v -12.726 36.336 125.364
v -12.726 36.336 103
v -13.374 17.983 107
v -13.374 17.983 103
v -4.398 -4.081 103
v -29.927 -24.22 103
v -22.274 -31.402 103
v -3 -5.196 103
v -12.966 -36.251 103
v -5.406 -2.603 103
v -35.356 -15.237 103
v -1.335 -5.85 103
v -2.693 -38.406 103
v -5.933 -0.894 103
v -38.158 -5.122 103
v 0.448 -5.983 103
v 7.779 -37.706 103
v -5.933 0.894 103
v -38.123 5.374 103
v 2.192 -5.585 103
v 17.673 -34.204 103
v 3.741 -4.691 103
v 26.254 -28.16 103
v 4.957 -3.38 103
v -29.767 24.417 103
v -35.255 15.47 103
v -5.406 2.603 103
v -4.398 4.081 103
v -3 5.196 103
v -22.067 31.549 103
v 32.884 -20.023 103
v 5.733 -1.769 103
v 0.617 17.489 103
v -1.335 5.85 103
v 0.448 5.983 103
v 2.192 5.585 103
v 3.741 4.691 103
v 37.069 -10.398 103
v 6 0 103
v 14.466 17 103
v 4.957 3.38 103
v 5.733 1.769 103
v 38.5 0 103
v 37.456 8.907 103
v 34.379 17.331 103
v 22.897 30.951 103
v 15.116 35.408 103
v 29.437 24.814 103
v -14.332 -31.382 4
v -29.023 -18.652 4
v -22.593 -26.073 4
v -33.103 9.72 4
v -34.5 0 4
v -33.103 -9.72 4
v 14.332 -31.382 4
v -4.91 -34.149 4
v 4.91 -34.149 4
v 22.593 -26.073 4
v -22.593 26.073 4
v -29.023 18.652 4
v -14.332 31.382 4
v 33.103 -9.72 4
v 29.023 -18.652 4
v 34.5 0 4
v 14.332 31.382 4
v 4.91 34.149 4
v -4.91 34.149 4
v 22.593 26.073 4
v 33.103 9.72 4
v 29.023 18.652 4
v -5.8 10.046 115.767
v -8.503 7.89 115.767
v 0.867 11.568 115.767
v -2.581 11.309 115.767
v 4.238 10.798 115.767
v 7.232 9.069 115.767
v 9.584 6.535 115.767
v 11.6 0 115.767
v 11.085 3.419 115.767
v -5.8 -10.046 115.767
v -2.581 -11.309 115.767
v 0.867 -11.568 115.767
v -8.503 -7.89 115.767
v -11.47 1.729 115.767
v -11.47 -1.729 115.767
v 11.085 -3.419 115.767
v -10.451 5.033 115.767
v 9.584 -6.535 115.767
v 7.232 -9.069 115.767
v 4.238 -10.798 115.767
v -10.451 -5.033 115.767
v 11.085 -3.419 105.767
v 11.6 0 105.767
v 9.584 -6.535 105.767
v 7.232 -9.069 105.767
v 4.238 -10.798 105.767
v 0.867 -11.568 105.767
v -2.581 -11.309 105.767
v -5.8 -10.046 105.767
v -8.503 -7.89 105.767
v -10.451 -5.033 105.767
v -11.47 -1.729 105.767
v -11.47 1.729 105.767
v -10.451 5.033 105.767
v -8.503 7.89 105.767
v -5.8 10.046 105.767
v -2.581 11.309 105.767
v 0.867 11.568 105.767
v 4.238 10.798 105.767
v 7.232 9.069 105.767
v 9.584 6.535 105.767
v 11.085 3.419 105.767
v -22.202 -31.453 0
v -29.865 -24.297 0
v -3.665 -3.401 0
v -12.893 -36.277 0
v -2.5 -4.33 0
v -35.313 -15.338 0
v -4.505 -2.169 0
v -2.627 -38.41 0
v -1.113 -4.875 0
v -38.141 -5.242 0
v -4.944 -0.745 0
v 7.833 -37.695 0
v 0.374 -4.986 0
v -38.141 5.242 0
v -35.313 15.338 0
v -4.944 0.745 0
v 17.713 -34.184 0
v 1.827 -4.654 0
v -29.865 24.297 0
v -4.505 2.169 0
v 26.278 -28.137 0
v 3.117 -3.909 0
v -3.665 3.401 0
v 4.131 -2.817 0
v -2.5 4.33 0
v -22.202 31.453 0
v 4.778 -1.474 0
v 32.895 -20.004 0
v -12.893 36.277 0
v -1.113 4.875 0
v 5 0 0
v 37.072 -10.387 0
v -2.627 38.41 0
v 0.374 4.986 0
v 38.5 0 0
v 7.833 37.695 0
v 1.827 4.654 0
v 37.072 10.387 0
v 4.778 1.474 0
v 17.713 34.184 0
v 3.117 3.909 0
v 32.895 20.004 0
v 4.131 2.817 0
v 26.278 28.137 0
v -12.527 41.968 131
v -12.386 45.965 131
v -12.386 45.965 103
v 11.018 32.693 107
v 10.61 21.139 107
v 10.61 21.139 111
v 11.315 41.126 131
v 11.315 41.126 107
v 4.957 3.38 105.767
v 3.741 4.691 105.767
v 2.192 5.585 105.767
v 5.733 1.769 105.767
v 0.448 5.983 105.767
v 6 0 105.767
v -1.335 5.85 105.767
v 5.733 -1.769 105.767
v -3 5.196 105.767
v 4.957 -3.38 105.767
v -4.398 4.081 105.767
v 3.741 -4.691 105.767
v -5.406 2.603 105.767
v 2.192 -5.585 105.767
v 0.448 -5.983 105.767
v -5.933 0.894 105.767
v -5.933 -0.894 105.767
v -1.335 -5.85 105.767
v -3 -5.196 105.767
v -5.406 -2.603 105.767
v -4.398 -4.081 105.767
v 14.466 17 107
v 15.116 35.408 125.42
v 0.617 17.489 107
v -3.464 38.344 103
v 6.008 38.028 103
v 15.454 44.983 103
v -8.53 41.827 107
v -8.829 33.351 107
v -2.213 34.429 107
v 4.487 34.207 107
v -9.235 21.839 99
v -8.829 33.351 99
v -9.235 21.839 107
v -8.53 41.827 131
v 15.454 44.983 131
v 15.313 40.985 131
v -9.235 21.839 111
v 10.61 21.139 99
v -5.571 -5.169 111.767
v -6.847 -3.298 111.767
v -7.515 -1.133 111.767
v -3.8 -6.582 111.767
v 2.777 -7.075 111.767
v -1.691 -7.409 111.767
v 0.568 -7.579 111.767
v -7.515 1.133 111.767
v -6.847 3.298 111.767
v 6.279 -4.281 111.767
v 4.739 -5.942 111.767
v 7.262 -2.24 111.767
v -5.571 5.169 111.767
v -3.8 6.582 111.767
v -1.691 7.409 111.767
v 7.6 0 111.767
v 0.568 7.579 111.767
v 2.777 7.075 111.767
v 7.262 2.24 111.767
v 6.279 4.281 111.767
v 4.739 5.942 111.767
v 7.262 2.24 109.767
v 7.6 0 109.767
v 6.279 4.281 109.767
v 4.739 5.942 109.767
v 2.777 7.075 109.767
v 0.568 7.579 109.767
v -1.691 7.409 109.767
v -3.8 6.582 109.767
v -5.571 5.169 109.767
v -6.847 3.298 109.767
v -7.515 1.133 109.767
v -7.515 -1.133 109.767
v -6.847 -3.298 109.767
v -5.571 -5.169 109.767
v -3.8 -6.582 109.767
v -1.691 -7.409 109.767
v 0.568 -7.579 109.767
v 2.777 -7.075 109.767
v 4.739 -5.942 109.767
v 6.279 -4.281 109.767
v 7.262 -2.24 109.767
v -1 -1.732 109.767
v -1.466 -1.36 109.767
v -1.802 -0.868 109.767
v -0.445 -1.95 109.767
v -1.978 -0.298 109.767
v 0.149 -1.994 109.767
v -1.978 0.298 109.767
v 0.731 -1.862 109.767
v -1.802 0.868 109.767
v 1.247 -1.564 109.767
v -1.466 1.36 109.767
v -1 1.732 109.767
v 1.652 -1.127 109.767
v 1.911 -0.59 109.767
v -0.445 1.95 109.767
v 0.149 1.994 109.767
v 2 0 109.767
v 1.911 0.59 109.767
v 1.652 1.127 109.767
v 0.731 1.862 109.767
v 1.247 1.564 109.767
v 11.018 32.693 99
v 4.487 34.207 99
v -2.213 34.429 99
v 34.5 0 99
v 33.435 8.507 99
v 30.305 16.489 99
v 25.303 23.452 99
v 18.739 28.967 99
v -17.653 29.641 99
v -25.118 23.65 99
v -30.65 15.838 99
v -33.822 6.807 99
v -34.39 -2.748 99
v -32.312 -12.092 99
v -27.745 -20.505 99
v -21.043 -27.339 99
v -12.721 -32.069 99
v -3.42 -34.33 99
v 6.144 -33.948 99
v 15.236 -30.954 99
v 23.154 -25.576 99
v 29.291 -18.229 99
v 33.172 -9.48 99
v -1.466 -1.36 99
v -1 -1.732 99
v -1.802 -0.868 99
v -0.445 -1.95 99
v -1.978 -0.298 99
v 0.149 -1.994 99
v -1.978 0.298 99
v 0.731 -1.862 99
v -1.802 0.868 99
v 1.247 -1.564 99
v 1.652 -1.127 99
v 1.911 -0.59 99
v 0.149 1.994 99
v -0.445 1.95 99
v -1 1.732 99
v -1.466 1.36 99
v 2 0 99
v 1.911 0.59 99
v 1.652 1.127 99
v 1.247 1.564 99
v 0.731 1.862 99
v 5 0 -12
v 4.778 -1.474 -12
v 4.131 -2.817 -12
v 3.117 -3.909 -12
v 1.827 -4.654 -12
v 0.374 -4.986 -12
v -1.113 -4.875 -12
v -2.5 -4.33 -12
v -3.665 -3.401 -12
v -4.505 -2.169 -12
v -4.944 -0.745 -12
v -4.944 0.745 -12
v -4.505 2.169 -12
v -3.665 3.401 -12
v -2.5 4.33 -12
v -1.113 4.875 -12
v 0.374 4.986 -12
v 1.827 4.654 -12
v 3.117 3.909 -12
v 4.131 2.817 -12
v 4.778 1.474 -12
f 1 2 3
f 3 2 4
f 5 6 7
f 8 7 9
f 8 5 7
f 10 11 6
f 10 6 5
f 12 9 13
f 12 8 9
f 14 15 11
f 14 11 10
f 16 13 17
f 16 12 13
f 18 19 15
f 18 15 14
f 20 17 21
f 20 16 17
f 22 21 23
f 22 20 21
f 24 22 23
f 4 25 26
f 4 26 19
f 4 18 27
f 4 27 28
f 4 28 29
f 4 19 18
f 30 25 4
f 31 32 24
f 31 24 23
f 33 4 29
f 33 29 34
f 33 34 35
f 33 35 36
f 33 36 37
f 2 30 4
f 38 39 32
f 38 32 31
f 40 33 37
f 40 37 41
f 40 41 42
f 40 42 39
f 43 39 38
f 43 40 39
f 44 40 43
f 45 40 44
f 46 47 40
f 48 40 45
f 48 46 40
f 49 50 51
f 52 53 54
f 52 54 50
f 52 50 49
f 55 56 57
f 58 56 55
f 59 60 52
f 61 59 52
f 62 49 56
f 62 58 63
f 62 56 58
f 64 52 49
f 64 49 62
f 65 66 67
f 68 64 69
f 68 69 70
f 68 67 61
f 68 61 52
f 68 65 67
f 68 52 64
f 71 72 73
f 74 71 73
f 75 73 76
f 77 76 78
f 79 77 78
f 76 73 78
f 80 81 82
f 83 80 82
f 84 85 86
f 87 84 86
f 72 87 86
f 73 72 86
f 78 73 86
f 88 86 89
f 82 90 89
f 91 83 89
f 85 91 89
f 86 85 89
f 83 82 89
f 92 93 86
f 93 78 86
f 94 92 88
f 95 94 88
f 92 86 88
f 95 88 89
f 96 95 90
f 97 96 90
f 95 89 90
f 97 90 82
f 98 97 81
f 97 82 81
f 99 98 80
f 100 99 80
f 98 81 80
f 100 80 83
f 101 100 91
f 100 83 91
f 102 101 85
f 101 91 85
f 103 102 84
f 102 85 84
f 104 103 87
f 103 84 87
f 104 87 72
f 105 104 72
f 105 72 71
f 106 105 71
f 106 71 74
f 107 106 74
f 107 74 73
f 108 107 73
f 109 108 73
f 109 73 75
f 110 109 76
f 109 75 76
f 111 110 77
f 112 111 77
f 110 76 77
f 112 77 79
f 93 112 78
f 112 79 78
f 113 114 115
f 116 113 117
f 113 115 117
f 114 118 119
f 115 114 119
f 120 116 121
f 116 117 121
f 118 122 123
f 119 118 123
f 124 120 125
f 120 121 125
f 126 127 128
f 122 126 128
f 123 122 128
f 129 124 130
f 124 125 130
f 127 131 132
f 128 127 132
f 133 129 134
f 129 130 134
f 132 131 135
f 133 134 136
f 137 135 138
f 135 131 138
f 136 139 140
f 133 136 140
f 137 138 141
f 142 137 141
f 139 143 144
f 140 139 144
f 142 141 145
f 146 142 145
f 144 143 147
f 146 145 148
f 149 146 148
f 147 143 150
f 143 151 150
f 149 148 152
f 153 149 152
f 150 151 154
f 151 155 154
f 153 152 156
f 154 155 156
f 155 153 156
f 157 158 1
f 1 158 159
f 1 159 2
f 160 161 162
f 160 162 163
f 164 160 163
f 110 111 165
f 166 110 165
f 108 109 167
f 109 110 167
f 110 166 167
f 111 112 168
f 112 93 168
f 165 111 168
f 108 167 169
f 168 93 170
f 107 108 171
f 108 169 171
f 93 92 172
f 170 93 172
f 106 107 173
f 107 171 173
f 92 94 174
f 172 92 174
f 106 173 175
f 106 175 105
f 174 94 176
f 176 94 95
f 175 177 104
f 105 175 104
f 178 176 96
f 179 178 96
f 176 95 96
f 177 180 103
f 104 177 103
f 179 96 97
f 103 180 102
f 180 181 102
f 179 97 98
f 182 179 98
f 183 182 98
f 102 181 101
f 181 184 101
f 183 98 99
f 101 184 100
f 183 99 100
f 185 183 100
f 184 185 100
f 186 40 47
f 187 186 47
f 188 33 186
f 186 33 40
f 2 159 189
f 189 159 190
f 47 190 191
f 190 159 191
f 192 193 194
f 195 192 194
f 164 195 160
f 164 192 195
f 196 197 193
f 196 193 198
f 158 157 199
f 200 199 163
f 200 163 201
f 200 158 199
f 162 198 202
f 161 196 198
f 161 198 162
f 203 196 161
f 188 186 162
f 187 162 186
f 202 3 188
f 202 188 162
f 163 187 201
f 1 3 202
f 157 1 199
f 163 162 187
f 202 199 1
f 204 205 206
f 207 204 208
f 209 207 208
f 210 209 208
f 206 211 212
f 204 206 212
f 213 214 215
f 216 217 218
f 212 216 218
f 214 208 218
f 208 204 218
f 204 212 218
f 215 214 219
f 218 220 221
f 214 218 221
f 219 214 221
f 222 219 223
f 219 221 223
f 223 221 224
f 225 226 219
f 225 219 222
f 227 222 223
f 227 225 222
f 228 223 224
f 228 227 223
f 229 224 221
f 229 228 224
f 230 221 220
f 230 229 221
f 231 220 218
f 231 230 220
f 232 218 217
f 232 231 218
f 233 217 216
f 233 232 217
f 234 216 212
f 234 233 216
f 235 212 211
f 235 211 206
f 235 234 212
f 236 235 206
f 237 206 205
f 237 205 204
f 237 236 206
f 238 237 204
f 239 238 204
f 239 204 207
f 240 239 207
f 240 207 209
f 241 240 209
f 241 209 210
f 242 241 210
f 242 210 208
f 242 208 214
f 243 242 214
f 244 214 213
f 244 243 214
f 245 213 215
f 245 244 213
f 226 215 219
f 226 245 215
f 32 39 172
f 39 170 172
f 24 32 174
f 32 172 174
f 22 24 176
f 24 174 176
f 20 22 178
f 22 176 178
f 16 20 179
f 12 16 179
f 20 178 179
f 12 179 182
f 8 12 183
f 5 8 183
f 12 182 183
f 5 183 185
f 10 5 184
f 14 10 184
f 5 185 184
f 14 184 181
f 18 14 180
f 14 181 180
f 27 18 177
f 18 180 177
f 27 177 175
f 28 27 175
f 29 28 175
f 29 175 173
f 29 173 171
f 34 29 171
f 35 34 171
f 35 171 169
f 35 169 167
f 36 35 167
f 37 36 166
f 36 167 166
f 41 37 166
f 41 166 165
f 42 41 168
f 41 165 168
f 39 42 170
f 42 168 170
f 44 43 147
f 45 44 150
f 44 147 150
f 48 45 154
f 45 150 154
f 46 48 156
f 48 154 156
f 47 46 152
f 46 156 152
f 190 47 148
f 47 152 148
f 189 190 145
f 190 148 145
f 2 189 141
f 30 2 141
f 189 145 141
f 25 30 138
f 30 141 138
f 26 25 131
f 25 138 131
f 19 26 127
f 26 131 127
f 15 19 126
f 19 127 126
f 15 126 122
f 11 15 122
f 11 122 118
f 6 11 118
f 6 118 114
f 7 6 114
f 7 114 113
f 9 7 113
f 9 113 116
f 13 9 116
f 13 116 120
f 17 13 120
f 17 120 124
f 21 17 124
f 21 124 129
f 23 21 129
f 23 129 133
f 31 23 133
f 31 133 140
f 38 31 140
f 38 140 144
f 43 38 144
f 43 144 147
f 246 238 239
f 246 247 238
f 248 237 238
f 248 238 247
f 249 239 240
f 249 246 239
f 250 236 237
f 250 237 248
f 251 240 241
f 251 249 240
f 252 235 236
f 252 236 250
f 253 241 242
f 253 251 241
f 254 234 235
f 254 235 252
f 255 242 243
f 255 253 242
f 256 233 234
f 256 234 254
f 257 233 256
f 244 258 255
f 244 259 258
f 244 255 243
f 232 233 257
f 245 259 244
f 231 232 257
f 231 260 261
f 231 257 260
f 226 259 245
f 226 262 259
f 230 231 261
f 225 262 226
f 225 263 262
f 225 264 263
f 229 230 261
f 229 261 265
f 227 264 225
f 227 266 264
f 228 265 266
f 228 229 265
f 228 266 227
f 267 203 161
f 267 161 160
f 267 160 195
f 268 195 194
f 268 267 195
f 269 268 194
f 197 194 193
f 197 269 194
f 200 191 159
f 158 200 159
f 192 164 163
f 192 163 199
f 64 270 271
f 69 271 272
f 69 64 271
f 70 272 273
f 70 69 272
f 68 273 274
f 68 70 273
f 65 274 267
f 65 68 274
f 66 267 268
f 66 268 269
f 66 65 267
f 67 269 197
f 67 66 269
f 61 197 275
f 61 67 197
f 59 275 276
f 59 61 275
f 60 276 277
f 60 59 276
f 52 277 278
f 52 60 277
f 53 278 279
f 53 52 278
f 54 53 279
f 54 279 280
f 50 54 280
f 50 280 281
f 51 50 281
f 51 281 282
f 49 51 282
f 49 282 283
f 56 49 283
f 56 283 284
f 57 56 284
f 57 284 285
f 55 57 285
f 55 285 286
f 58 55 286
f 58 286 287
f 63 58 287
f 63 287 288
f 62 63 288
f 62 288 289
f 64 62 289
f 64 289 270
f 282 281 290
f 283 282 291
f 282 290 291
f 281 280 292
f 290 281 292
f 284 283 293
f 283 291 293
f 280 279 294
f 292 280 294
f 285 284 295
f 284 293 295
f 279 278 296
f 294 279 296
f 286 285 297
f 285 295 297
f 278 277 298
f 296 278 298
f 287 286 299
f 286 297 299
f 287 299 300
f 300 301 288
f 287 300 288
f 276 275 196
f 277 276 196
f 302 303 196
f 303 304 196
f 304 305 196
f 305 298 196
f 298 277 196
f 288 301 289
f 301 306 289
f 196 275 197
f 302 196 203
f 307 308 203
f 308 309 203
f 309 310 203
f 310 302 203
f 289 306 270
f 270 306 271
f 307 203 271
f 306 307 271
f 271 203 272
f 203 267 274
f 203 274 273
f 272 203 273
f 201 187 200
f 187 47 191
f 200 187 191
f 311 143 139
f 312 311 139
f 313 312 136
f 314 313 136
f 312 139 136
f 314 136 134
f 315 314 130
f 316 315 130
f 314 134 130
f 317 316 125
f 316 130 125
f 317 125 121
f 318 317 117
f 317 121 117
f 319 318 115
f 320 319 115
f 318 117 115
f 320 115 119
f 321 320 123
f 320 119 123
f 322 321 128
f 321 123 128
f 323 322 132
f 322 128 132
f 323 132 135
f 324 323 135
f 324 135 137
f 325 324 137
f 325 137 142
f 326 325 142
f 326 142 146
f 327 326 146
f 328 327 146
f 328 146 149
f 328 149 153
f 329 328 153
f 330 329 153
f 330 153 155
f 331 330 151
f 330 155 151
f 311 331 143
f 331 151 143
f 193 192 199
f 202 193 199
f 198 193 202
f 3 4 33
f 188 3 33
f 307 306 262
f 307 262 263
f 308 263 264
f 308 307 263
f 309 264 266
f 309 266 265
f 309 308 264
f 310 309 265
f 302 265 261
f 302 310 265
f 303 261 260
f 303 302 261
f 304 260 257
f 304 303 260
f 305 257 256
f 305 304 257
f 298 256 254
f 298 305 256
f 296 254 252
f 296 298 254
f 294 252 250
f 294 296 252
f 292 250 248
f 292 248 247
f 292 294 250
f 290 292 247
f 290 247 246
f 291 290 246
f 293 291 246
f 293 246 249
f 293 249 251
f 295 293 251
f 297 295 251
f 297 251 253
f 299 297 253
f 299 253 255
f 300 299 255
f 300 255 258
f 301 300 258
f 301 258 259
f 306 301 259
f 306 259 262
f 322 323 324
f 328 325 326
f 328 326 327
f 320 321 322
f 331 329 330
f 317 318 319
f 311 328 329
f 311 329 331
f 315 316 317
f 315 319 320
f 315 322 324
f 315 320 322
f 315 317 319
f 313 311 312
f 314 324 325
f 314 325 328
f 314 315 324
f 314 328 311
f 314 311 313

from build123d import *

# Parameters (mm, degrees)
SKETCH1_R            = 38.5
BOSS_EXTRUDE1_DEPTH  = 103
BOSS_EXTRUDE2_DEPTH  = 28
CUT_EXTRUDE1_DEPTH   = 28
SHELL2_START         = 4
SHELL2_OUTLINE_R     = 34.5
SHELL2_DEPTH         = 95
SHELL2_START_2       = 107
SHELL2_2_DEPTH       = 24
SHELL2_START_3       = 99
SHELL2_3_OUTLINE_R   = 2
SHELL2_3_DEPTH       = 12.767166294
SHELL2_START_4       = 109.767166294
SHELL2_4_OUTLINE_R   = 7.6
SHELL2_4_OUTLINE_R_2 = 2
SHELL2_4_DEPTH       = 2
SKETCH6_R            = 5
BOSS_EXTRUDE3_DEPTH  = 12


# Read off the part's stored shape, not the designer's step: Shell2
with BuildPart() as part:
    # Sketch1 → Boss-Extrude1 (new body)
    with BuildSketch(Plane.XY):
        Circle(SKETCH1_R)
    extrude(amount=BOSS_EXTRUDE1_DEPTH)

    # Sketch3 → Revolve1 (revolve)
    with BuildSketch(Plane(origin=(0, 0, 0), x_dir=(0, 0, -1), z_dir=(1, 0, 0)), mode=Mode.PRIVATE) as revolve1_sk:
        Polygon((-103, 0), (-103, -6), (-105.767166294, -6), (-105.767166294, -11.6), (-115.767166294, -11.6), (-115.767166294, 0), align=None)
    revolve(revolve1_sk.sketch.rotate(Axis((0, 0, 115.767166294), (0, 0, -1)), 270), axis=Axis((0, 0, 115.767166294), (0, 0, -1)))

    # Sketch4 → Boss-Extrude2 (add)
    with BuildSketch(Plane.XY.offset(103)):
        with BuildLine():
            Line((14.466142326, 17.000326533), (15.115842287, 35.408492088))
            ThreePointArc((15.115842287, 35.408492088), (1.281597128, 38.478663033), (-12.726276266, 36.335821064))
            Line((-12.726276266, 36.335821064), (-13.374025691, 17.982920698))
            Line((-13.374025691, 17.982920698), (0.617262695, 17.48911052))
            Line((0.617262695, 17.48911052), (14.466142326, 17.000326533))
        make_face()
        with BuildLine():
            Line((15.115842287, 35.408492088), (15.453762685, 44.982903362))
            Line((15.453762685, 44.982903362), (-12.386405332, 45.965497528))
            Line((-12.386405332, 45.965497528), (-12.726276266, 36.335821064))
            ThreePointArc((-12.726276266, 36.335821064), (1.281597128, 38.478663033), (15.115842287, 35.408492088))
        make_face()
    extrude(amount=BOSS_EXTRUDE2_DEPTH)

    # Sketch5 → Cut-Extrude1 (cut)
    with BuildSketch(Plane(origin=(-13.991288415, 0.493810179, 0), x_dir=(0, 0, 1), z_dir=(-0.9993777439159626, 0.03527215566762106, 0))):
        Polygon((107, 17.5), (131, 41.5), (131, 17.5), align=None)
    extrude(amount=-CUT_EXTRUDE1_DEPTH, mode=Mode.SUBTRACT)

    # Shell2 outline → Shell2 (cut)
    with BuildSketch(Plane.XY.offset(SHELL2_START)):
        Circle(SHELL2_OUTLINE_R)
    extrude(amount=SHELL2_DEPTH, mode=Mode.SUBTRACT)

    # Shell2 2 outline → Shell2 2 (cut)
    with BuildSketch(Plane.XY.offset(SHELL2_START_2)):
        Polygon((-9.235426092, 21.839343051), (10.609719973, 21.138926131), (11.315163087, 41.126481009), (-8.529982979, 41.826897929), align=None)
    extrude(amount=SHELL2_2_DEPTH, mode=Mode.SUBTRACT)

    # Shell2 3 outline → Shell2 3 (cut)
    with BuildSketch(Plane.XY.offset(SHELL2_START_3)):
        with BuildLine():
            Line((-9.235426092, 21.839343051), (10.609719973, 21.138926131))
            Line((10.609719973, 21.138926131), (11.017527996, 32.693486765))
            ThreePointArc((11.017527996, 32.693486765), (1.142536641, 34.481076115), (-8.82912846, 33.351109286))
            Line((-8.82912846, 33.351109286), (-9.235426092, 21.839343051))
        make_face()
        Circle(SHELL2_3_OUTLINE_R)
    extrude(amount=SHELL2_3_DEPTH, mode=Mode.SUBTRACT)

    # Shell2 4 outline → Shell2 4 (cut)
    with BuildSketch(Plane.XY.offset(SHELL2_START_4)):
        Circle(SHELL2_4_OUTLINE_R)
        Circle(SHELL2_4_OUTLINE_R_2, mode=Mode.SUBTRACT)
    extrude(amount=SHELL2_4_DEPTH, mode=Mode.SUBTRACT)

    # Sketch6 → Boss-Extrude3 (add)
    with BuildSketch(Plane(origin=(0, 0, 0), x_dir=(-1, 0, 0), z_dir=(0, 0, -1))):
        with Locations(Location((0, 0, 0), (0, 0, 180))):
            Circle(SKETCH6_R)
    extrude(amount=BOSS_EXTRUDE3_DEPTH)


solid = part.part
